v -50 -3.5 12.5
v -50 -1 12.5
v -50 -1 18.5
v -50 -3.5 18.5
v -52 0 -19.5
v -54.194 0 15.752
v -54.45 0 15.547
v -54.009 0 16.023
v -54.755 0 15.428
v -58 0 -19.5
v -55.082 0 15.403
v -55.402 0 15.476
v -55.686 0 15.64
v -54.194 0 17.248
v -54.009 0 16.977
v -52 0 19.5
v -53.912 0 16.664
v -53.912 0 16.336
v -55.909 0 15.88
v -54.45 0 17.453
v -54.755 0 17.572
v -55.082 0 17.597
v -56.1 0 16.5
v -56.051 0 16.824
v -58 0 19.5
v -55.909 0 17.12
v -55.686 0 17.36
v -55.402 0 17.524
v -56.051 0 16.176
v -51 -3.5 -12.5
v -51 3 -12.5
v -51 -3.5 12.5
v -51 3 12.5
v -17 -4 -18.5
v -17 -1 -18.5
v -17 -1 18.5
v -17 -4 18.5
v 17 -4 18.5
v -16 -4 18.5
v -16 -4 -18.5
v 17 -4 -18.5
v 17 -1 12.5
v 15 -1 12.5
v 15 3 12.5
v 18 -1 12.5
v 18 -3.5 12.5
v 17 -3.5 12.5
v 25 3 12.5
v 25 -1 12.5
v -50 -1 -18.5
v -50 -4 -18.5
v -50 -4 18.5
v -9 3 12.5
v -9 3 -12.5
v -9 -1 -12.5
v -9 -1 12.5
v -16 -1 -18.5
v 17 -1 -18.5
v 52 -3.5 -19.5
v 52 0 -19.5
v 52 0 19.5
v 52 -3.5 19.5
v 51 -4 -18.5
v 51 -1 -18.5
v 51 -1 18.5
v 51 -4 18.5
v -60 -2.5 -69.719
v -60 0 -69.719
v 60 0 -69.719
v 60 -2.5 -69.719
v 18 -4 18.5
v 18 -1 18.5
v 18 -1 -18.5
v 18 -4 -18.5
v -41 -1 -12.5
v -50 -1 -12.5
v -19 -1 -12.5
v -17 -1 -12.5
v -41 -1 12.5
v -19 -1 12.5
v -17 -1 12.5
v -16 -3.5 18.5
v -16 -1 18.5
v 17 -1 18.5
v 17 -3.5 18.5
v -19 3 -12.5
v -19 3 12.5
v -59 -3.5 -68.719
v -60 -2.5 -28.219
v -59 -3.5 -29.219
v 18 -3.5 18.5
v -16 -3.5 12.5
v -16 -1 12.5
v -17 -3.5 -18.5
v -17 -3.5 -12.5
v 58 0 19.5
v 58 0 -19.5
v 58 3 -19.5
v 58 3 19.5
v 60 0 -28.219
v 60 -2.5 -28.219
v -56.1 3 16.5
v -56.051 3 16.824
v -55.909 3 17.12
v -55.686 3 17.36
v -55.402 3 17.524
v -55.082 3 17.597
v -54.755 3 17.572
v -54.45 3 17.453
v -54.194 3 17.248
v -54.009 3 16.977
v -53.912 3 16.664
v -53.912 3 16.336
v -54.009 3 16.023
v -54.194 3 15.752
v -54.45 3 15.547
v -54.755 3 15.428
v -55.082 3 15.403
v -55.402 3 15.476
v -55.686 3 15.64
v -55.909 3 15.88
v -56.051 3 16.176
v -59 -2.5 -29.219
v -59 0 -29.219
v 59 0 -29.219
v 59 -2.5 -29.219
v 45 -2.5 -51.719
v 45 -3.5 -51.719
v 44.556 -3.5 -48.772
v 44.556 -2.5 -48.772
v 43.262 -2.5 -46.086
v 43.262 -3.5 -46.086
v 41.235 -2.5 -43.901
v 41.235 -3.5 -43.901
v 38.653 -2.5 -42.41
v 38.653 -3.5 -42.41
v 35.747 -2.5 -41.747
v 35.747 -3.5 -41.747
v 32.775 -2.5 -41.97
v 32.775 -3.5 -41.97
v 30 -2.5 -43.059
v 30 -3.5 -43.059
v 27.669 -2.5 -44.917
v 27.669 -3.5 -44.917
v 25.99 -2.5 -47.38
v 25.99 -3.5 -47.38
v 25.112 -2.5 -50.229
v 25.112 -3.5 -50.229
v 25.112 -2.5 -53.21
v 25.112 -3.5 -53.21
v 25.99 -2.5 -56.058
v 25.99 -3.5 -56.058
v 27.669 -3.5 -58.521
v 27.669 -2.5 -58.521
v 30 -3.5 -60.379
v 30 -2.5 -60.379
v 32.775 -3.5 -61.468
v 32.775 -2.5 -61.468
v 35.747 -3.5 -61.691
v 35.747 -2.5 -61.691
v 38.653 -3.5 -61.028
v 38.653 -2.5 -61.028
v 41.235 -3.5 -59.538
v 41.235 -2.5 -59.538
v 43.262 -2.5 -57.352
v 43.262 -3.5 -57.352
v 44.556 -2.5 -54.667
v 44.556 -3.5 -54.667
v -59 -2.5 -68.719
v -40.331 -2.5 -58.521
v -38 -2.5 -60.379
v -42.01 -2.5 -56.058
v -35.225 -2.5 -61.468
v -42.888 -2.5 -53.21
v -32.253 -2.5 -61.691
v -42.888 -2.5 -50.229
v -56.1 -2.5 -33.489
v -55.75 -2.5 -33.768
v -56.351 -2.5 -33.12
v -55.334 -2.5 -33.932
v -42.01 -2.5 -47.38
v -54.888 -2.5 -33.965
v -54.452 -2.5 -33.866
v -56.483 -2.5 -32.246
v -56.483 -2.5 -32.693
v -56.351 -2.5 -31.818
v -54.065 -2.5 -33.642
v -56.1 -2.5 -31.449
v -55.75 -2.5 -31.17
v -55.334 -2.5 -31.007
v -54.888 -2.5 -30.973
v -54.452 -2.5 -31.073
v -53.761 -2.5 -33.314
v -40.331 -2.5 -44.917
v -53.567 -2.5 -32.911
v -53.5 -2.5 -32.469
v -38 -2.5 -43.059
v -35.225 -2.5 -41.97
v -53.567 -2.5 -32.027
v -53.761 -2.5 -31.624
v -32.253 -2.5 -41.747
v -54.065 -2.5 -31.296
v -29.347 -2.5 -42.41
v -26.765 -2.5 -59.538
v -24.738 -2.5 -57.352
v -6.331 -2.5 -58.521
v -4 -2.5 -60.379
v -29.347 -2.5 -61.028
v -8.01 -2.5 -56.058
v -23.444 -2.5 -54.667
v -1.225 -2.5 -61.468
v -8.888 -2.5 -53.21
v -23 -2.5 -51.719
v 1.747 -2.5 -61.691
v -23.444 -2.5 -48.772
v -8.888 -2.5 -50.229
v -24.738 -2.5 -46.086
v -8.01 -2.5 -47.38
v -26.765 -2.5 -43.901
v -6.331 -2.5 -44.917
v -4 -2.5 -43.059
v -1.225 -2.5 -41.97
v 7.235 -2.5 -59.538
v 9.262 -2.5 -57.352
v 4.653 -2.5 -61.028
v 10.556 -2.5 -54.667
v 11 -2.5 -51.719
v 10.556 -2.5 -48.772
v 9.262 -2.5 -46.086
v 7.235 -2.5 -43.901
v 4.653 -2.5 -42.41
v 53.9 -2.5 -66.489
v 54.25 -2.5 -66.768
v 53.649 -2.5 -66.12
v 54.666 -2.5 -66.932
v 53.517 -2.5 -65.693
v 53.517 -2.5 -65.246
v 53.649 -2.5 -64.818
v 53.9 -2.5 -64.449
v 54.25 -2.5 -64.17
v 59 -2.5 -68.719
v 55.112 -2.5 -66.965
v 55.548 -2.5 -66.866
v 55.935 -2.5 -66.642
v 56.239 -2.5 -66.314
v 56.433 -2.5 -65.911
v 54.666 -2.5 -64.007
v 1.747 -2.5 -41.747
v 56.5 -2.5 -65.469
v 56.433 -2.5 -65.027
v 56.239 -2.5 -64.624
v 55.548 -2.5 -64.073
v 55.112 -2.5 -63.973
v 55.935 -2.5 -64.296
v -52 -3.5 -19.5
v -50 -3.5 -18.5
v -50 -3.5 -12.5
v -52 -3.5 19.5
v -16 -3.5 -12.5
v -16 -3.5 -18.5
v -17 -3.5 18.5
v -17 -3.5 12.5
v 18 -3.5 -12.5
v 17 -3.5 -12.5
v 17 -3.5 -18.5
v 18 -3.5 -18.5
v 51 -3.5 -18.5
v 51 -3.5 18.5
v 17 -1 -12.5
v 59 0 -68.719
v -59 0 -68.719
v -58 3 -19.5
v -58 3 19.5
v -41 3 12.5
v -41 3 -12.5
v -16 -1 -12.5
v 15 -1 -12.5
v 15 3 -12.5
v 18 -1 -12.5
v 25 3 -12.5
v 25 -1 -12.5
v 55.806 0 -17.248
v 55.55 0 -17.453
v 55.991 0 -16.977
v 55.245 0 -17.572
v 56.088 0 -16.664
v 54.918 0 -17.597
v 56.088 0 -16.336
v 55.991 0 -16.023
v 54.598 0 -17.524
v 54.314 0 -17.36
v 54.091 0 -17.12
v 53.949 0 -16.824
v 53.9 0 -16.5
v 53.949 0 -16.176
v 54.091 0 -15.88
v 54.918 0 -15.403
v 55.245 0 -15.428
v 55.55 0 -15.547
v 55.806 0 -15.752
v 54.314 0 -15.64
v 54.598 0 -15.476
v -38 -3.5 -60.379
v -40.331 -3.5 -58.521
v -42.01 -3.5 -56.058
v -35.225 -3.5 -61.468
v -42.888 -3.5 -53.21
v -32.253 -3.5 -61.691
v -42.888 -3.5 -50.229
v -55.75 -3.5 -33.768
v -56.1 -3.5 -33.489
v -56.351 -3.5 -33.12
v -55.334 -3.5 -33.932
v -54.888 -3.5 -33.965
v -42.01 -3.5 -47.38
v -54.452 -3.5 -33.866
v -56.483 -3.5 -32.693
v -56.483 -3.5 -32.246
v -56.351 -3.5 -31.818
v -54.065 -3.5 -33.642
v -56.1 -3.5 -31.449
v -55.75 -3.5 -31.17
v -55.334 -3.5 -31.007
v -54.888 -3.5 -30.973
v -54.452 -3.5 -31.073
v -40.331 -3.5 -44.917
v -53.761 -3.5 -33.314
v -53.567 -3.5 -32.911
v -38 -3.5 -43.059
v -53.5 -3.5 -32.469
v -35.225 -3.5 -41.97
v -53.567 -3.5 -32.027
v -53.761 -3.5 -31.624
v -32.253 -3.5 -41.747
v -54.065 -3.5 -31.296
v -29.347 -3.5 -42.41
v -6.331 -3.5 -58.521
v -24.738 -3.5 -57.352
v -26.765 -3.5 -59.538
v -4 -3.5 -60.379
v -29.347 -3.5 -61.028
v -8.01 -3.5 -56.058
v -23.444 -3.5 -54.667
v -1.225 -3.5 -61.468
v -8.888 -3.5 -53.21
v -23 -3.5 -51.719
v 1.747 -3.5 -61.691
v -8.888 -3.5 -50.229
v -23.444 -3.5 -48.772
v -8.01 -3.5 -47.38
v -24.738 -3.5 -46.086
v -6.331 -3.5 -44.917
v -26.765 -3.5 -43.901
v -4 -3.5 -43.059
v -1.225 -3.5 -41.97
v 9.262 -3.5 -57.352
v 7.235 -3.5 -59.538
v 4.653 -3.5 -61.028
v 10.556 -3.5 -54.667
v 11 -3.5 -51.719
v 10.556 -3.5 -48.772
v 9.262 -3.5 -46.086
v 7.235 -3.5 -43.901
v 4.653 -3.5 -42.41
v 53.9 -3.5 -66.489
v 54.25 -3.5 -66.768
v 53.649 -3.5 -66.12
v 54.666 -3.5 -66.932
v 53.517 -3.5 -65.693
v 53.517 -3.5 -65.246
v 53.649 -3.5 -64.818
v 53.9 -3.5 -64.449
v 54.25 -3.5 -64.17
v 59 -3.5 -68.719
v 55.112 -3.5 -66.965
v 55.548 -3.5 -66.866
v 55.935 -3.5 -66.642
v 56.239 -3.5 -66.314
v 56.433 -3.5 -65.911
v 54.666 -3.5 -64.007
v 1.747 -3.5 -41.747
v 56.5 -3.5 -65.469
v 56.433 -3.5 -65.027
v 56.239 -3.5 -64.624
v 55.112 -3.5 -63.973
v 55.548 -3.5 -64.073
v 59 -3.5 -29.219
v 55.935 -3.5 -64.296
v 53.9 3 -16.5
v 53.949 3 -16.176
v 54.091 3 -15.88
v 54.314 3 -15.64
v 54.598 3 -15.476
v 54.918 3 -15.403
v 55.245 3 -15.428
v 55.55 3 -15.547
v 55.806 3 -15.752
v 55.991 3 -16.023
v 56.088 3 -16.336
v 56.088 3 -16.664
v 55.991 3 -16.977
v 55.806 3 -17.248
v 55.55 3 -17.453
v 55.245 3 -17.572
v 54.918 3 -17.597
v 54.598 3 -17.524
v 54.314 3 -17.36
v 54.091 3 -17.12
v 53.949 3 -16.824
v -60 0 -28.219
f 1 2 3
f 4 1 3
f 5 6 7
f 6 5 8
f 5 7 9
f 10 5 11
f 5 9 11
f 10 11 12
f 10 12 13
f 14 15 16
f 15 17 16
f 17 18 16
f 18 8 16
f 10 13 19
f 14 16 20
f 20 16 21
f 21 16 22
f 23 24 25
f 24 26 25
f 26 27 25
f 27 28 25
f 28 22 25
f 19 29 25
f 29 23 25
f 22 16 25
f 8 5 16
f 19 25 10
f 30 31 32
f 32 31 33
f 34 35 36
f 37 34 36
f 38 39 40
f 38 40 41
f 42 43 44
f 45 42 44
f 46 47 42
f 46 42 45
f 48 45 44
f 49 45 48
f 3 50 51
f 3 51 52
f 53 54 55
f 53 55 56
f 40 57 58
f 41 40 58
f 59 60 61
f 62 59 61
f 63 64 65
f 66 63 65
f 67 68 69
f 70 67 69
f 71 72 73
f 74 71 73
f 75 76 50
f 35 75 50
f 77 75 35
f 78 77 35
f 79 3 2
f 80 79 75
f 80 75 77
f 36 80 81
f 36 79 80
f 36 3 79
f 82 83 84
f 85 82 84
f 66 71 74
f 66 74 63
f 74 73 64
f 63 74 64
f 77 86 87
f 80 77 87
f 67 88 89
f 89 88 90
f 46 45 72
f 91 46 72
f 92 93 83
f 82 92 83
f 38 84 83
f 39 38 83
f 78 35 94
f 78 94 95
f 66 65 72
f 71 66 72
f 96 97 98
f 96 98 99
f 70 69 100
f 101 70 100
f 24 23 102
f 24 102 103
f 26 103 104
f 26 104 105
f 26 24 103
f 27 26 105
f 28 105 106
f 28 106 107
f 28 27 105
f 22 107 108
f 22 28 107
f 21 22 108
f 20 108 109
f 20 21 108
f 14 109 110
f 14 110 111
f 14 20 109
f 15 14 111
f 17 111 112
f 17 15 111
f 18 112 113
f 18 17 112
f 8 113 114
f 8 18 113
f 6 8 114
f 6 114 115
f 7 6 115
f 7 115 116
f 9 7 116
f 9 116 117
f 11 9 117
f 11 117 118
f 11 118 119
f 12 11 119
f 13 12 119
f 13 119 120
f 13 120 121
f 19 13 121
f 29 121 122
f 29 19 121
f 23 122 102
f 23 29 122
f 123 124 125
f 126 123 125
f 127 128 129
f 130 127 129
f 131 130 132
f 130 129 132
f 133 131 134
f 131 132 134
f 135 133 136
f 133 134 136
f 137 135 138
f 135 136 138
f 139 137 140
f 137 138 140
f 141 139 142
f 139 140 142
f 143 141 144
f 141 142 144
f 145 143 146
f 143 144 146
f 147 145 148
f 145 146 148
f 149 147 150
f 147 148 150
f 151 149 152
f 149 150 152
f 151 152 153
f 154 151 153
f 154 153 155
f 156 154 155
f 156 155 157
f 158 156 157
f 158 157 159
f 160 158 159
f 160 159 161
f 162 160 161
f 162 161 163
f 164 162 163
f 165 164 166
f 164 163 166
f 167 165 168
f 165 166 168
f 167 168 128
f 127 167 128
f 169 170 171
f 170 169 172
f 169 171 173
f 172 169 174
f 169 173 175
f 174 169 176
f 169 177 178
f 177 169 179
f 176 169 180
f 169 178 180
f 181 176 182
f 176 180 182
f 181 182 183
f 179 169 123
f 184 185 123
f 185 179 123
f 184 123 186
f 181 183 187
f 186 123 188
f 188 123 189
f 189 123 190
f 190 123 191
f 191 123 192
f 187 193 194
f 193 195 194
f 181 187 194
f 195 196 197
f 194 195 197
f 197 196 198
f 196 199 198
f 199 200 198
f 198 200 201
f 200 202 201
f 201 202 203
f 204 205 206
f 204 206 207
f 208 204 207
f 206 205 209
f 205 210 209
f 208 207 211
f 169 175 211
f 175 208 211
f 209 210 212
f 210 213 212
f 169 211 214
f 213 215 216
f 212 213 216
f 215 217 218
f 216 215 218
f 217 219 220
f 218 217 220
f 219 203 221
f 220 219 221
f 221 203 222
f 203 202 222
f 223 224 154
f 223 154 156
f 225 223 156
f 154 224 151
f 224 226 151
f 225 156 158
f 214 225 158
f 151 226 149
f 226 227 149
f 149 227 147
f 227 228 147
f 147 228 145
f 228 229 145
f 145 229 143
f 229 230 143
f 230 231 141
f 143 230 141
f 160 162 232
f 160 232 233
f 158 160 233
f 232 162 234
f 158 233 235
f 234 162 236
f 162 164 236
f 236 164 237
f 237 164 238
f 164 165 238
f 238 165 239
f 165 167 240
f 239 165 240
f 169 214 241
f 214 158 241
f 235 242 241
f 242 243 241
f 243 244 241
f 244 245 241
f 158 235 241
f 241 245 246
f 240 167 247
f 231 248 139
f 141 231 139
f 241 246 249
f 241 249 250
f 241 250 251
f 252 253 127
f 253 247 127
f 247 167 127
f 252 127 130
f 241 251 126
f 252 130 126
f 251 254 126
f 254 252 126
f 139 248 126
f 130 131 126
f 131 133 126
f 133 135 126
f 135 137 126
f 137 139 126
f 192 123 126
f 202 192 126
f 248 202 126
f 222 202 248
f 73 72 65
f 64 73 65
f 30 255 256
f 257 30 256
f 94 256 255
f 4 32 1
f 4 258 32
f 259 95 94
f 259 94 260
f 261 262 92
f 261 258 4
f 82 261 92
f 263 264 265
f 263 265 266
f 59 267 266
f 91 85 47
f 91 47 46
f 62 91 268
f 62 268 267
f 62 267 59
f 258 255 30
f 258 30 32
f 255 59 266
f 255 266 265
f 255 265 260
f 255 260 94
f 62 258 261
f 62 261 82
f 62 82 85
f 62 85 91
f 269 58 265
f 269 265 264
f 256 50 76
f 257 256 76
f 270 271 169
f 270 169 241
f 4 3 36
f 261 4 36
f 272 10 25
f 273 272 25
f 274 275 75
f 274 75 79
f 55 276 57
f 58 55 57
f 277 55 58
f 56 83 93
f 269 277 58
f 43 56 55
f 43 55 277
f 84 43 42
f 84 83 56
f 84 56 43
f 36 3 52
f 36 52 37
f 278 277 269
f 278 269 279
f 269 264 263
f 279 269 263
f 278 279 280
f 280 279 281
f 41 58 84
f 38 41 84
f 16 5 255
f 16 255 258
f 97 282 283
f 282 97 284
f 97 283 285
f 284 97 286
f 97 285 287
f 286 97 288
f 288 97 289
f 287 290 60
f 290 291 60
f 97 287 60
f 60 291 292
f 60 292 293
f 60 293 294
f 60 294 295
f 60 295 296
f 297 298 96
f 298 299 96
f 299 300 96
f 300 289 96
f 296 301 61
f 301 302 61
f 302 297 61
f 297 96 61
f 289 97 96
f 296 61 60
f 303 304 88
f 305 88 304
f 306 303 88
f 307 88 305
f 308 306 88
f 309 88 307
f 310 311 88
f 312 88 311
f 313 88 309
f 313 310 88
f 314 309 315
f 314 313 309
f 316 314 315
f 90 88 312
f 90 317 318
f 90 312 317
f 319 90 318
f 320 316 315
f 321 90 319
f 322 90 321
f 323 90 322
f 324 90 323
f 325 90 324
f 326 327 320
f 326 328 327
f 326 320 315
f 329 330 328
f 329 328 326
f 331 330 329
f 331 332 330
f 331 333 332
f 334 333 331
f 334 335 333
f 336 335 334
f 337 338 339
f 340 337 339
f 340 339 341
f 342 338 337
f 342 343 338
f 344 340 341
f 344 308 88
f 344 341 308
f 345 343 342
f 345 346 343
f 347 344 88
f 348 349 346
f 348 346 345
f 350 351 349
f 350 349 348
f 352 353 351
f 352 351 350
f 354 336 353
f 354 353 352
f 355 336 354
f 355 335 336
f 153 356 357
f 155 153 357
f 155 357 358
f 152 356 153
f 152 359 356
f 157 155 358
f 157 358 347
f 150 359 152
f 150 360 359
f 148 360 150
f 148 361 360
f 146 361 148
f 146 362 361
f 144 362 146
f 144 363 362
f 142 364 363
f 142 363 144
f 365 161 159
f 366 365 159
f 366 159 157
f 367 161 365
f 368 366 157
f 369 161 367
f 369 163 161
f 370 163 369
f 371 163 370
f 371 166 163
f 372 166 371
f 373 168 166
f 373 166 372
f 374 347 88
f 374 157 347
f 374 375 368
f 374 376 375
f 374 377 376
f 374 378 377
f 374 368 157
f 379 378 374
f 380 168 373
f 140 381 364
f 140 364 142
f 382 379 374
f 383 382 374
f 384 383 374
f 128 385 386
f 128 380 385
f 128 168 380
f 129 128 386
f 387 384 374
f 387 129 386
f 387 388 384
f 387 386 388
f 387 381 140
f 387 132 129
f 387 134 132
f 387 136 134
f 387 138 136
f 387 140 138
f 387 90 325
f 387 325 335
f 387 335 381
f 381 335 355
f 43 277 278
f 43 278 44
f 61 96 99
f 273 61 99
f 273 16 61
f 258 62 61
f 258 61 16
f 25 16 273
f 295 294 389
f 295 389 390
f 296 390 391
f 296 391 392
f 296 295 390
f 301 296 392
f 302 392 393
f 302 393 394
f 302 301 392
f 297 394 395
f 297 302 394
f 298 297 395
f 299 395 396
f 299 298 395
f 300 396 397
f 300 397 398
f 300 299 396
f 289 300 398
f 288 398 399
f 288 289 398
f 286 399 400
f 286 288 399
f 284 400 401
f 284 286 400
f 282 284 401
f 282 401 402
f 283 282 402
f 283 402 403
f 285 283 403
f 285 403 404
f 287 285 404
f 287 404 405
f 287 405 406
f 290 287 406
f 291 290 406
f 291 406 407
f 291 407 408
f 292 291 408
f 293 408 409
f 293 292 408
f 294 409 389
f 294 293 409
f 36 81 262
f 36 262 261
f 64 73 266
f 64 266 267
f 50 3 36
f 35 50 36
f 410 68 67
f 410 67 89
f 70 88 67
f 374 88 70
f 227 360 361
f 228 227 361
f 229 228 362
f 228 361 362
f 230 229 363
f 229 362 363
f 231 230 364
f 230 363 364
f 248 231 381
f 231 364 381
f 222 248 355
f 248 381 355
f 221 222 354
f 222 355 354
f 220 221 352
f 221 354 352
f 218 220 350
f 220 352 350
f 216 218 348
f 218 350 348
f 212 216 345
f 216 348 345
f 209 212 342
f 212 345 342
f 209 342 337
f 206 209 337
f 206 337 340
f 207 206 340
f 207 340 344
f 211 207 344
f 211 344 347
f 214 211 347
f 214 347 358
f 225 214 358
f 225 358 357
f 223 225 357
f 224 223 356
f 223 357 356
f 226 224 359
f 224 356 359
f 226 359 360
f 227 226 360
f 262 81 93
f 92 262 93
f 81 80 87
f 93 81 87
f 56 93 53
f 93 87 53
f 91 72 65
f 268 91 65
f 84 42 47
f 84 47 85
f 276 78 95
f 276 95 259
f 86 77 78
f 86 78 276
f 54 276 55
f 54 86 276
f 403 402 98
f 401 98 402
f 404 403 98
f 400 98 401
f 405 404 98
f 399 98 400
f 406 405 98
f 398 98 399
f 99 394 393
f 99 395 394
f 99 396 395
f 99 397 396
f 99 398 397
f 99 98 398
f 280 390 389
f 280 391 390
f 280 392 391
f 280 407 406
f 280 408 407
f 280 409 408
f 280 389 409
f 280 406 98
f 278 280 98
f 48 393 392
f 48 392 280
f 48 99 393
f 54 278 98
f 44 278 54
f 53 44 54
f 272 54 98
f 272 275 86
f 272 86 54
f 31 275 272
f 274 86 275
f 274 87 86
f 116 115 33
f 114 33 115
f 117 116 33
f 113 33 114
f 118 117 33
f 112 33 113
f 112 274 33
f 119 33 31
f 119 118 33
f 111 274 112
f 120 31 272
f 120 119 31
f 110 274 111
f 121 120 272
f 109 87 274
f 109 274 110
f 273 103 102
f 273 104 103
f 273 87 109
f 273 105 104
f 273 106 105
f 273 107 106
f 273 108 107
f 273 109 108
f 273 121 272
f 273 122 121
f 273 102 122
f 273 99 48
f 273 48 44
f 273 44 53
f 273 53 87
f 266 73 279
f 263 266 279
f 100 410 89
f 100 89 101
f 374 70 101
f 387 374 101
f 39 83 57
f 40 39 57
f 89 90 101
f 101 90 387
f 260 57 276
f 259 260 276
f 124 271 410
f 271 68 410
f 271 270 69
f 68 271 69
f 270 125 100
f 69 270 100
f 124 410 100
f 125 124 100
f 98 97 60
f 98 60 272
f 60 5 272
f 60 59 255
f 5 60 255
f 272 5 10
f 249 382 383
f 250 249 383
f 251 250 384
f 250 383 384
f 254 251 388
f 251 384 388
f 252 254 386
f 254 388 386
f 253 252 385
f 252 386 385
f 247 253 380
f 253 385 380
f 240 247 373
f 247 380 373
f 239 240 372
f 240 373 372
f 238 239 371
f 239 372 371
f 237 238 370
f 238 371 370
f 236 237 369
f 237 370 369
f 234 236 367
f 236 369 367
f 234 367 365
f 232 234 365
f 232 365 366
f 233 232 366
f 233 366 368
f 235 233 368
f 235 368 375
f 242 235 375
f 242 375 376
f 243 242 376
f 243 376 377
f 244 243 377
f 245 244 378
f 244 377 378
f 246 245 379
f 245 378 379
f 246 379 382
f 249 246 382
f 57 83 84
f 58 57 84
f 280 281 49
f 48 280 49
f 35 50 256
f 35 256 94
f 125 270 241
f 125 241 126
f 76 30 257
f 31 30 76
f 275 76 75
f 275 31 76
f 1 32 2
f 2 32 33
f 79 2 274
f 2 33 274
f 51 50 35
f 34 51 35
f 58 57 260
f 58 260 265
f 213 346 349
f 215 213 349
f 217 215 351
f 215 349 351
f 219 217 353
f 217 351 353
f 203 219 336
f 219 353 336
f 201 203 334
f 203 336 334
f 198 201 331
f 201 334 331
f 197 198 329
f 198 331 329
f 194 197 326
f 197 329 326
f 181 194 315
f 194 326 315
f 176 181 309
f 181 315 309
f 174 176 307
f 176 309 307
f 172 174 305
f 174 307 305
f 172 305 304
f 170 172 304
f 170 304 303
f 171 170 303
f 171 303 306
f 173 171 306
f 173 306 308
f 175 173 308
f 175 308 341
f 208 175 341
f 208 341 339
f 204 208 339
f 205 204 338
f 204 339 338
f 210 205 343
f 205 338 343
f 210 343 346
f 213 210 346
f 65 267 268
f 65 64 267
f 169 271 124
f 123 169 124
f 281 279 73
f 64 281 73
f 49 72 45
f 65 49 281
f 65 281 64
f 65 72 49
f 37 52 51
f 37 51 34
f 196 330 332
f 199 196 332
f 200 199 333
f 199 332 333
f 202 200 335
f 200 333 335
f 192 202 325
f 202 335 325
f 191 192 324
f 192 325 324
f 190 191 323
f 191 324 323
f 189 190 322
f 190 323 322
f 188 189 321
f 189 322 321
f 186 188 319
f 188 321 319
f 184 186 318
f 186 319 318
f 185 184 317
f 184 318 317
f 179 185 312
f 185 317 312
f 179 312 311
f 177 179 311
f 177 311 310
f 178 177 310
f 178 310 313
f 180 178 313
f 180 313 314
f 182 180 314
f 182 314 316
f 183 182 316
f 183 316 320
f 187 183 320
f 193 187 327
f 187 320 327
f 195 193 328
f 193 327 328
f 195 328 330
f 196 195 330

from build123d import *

# Parameters (mm, degrees)
F0_W      = 104
F0_H      = 39
F1_DEPTH  = 3.5
F2_T      = -1
F3_W      = 1
F3_H      = 37
F4_DEPTH  = 2.5
F5_W      = 116
F5_H      = 39
F5_R      = 1.1
F6_DEPTH  = 3
F7_W      = 10
F7_H      = 25
F8_DEPTH  = 5.6
F9_W      = 120
F9_H      = 41.5
F10_DEPTH = 3.5
F11_T     = -1
F12_R     = 1.5
F12_R_2   = 10
F13_DEPTH = 1
F14_SIZE  = 1
F15_W     = 33
F15_H     = 37
F16_DEPTH = 3


with BuildPart() as f1:
    # F0 (on Front) → F1 (new body)
    with BuildSketch(Plane.XZ):
        Rectangle(F0_W, F0_H)
    extrude(amount=F1_DEPTH)

    # F2
    f2_openings = [f1.faces().sort_by_distance(p)[0] for p in [
        (0, -3.5, 0),
    ]]
    offset(amount=F2_T, openings=f2_openings)

    # F3 (on face) → F4 (join)
    with BuildSketch(Plane.XZ.offset(1)):
        with Locations((-16.5, 0)):
            Rectangle(F3_W, F3_H)
        with Locations((17.5, 0)):
            Rectangle(F3_W, F3_H)
        with Locations((-50.5, 0)):
            Rectangle(F3_W, F3_H)
    extrude(amount=F4_DEPTH)

    # F5 (on face) → F6 (join)
    with BuildSketch(Plane(origin=(0, 0, 0), x_dir=(-1, 0, 0), z_dir=(0, 1, 0))):
        Rectangle(F5_W, F5_H)
        with Locations((-55, -16.5)):
            Circle(F5_R, mode=Mode.SUBTRACT)
        with Locations((55, 16.5)):
            Circle(F5_R, mode=Mode.SUBTRACT)
    extrude(amount=F6_DEPTH)

    # F7 (on Front) → F8 (cut, symmetric)
    with BuildSketch(Plane.XZ):
        with Locations((-46, 0)):
            Rectangle(F7_W, F7_H)
        with Locations((-14, 0)):
            Rectangle(F7_W, F7_H)
        with Locations((20, 0)):
            Rectangle(F7_W, F7_H)
    extrude(amount=F8_DEPTH, both=True, mode=Mode.SUBTRACT)


with BuildPart() as f10:
    # F9 (on Front) → F10 (new body)
    with BuildSketch(Plane.XZ):
        with Locations((0, -48.9692046804)):
            Rectangle(F9_W, F9_H)
    extrude(amount=F10_DEPTH)

    # F11
    f11_openings = [f10.faces().sort_by_distance(p)[0] for p in [
        (0, 0, -48.969205),
    ]]
    offset(amount=F11_T, openings=f11_openings)

    # F12 (on face) → F13 (cut)
    with BuildSketch(Plane.XZ.offset(3.5)):
        with Locations((55, -65.4692046804)):
            Circle(F12_R)
        with Locations((-55, -32.4692046804)):
            Circle(F12_R)
        with Locations((-33, -51.7192046804)):
            Circle(F12_R_2)
        with Locations((1, -51.7192046804)):
            Circle(F12_R_2)
        with Locations((35, -51.7192046804)):
            Circle(F12_R_2)
    extrude(amount=-F13_DEPTH, mode=Mode.SUBTRACT)

    # F14
    f14_edges = [f10.edges().sort_by_distance(p)[0] for p in [
        (0, -3.5, -28.219205),
        (-60, -3.5, -48.969205),
        (60, -3.5, -48.969205),
        (0, -3.5, -69.719205),
    ]]
    chamfer(f14_edges, length=F14_SIZE)


with BuildPart() as f16:
    # F15 (on face) → F16 (new body)
    with BuildSketch(Plane.XZ.offset(1)):
        with Locations((-33.5, 0)):
            Rectangle(F15_W, F15_H)
    extrude(amount=F16_DEPTH)


with BuildPart() as f16b:
    # F15 (on face) → F16, piece 2 (new body)
    with BuildSketch(Plane.XZ.offset(1)):
        Polygon((17, -12.5), (17, 18.5), (-16, 18.5), (-16, 12.5), (-16, -18.5), (17, -18.5), align=None)
    extrude(amount=F16_DEPTH)


with BuildPart() as f16c:
    # F15 (on face) → F16, piece 3 (new body)
    with BuildSketch(Plane.XZ.offset(1)):
        Polygon((51, -18.5), (51, 18.5), (18, 18.5), (18, 12.5), (18, -18.5), align=None)
    extrude(amount=F16_DEPTH)


solid = Compound([f1.part, f10.part, f16.part, f16b.part, f16c.part])
